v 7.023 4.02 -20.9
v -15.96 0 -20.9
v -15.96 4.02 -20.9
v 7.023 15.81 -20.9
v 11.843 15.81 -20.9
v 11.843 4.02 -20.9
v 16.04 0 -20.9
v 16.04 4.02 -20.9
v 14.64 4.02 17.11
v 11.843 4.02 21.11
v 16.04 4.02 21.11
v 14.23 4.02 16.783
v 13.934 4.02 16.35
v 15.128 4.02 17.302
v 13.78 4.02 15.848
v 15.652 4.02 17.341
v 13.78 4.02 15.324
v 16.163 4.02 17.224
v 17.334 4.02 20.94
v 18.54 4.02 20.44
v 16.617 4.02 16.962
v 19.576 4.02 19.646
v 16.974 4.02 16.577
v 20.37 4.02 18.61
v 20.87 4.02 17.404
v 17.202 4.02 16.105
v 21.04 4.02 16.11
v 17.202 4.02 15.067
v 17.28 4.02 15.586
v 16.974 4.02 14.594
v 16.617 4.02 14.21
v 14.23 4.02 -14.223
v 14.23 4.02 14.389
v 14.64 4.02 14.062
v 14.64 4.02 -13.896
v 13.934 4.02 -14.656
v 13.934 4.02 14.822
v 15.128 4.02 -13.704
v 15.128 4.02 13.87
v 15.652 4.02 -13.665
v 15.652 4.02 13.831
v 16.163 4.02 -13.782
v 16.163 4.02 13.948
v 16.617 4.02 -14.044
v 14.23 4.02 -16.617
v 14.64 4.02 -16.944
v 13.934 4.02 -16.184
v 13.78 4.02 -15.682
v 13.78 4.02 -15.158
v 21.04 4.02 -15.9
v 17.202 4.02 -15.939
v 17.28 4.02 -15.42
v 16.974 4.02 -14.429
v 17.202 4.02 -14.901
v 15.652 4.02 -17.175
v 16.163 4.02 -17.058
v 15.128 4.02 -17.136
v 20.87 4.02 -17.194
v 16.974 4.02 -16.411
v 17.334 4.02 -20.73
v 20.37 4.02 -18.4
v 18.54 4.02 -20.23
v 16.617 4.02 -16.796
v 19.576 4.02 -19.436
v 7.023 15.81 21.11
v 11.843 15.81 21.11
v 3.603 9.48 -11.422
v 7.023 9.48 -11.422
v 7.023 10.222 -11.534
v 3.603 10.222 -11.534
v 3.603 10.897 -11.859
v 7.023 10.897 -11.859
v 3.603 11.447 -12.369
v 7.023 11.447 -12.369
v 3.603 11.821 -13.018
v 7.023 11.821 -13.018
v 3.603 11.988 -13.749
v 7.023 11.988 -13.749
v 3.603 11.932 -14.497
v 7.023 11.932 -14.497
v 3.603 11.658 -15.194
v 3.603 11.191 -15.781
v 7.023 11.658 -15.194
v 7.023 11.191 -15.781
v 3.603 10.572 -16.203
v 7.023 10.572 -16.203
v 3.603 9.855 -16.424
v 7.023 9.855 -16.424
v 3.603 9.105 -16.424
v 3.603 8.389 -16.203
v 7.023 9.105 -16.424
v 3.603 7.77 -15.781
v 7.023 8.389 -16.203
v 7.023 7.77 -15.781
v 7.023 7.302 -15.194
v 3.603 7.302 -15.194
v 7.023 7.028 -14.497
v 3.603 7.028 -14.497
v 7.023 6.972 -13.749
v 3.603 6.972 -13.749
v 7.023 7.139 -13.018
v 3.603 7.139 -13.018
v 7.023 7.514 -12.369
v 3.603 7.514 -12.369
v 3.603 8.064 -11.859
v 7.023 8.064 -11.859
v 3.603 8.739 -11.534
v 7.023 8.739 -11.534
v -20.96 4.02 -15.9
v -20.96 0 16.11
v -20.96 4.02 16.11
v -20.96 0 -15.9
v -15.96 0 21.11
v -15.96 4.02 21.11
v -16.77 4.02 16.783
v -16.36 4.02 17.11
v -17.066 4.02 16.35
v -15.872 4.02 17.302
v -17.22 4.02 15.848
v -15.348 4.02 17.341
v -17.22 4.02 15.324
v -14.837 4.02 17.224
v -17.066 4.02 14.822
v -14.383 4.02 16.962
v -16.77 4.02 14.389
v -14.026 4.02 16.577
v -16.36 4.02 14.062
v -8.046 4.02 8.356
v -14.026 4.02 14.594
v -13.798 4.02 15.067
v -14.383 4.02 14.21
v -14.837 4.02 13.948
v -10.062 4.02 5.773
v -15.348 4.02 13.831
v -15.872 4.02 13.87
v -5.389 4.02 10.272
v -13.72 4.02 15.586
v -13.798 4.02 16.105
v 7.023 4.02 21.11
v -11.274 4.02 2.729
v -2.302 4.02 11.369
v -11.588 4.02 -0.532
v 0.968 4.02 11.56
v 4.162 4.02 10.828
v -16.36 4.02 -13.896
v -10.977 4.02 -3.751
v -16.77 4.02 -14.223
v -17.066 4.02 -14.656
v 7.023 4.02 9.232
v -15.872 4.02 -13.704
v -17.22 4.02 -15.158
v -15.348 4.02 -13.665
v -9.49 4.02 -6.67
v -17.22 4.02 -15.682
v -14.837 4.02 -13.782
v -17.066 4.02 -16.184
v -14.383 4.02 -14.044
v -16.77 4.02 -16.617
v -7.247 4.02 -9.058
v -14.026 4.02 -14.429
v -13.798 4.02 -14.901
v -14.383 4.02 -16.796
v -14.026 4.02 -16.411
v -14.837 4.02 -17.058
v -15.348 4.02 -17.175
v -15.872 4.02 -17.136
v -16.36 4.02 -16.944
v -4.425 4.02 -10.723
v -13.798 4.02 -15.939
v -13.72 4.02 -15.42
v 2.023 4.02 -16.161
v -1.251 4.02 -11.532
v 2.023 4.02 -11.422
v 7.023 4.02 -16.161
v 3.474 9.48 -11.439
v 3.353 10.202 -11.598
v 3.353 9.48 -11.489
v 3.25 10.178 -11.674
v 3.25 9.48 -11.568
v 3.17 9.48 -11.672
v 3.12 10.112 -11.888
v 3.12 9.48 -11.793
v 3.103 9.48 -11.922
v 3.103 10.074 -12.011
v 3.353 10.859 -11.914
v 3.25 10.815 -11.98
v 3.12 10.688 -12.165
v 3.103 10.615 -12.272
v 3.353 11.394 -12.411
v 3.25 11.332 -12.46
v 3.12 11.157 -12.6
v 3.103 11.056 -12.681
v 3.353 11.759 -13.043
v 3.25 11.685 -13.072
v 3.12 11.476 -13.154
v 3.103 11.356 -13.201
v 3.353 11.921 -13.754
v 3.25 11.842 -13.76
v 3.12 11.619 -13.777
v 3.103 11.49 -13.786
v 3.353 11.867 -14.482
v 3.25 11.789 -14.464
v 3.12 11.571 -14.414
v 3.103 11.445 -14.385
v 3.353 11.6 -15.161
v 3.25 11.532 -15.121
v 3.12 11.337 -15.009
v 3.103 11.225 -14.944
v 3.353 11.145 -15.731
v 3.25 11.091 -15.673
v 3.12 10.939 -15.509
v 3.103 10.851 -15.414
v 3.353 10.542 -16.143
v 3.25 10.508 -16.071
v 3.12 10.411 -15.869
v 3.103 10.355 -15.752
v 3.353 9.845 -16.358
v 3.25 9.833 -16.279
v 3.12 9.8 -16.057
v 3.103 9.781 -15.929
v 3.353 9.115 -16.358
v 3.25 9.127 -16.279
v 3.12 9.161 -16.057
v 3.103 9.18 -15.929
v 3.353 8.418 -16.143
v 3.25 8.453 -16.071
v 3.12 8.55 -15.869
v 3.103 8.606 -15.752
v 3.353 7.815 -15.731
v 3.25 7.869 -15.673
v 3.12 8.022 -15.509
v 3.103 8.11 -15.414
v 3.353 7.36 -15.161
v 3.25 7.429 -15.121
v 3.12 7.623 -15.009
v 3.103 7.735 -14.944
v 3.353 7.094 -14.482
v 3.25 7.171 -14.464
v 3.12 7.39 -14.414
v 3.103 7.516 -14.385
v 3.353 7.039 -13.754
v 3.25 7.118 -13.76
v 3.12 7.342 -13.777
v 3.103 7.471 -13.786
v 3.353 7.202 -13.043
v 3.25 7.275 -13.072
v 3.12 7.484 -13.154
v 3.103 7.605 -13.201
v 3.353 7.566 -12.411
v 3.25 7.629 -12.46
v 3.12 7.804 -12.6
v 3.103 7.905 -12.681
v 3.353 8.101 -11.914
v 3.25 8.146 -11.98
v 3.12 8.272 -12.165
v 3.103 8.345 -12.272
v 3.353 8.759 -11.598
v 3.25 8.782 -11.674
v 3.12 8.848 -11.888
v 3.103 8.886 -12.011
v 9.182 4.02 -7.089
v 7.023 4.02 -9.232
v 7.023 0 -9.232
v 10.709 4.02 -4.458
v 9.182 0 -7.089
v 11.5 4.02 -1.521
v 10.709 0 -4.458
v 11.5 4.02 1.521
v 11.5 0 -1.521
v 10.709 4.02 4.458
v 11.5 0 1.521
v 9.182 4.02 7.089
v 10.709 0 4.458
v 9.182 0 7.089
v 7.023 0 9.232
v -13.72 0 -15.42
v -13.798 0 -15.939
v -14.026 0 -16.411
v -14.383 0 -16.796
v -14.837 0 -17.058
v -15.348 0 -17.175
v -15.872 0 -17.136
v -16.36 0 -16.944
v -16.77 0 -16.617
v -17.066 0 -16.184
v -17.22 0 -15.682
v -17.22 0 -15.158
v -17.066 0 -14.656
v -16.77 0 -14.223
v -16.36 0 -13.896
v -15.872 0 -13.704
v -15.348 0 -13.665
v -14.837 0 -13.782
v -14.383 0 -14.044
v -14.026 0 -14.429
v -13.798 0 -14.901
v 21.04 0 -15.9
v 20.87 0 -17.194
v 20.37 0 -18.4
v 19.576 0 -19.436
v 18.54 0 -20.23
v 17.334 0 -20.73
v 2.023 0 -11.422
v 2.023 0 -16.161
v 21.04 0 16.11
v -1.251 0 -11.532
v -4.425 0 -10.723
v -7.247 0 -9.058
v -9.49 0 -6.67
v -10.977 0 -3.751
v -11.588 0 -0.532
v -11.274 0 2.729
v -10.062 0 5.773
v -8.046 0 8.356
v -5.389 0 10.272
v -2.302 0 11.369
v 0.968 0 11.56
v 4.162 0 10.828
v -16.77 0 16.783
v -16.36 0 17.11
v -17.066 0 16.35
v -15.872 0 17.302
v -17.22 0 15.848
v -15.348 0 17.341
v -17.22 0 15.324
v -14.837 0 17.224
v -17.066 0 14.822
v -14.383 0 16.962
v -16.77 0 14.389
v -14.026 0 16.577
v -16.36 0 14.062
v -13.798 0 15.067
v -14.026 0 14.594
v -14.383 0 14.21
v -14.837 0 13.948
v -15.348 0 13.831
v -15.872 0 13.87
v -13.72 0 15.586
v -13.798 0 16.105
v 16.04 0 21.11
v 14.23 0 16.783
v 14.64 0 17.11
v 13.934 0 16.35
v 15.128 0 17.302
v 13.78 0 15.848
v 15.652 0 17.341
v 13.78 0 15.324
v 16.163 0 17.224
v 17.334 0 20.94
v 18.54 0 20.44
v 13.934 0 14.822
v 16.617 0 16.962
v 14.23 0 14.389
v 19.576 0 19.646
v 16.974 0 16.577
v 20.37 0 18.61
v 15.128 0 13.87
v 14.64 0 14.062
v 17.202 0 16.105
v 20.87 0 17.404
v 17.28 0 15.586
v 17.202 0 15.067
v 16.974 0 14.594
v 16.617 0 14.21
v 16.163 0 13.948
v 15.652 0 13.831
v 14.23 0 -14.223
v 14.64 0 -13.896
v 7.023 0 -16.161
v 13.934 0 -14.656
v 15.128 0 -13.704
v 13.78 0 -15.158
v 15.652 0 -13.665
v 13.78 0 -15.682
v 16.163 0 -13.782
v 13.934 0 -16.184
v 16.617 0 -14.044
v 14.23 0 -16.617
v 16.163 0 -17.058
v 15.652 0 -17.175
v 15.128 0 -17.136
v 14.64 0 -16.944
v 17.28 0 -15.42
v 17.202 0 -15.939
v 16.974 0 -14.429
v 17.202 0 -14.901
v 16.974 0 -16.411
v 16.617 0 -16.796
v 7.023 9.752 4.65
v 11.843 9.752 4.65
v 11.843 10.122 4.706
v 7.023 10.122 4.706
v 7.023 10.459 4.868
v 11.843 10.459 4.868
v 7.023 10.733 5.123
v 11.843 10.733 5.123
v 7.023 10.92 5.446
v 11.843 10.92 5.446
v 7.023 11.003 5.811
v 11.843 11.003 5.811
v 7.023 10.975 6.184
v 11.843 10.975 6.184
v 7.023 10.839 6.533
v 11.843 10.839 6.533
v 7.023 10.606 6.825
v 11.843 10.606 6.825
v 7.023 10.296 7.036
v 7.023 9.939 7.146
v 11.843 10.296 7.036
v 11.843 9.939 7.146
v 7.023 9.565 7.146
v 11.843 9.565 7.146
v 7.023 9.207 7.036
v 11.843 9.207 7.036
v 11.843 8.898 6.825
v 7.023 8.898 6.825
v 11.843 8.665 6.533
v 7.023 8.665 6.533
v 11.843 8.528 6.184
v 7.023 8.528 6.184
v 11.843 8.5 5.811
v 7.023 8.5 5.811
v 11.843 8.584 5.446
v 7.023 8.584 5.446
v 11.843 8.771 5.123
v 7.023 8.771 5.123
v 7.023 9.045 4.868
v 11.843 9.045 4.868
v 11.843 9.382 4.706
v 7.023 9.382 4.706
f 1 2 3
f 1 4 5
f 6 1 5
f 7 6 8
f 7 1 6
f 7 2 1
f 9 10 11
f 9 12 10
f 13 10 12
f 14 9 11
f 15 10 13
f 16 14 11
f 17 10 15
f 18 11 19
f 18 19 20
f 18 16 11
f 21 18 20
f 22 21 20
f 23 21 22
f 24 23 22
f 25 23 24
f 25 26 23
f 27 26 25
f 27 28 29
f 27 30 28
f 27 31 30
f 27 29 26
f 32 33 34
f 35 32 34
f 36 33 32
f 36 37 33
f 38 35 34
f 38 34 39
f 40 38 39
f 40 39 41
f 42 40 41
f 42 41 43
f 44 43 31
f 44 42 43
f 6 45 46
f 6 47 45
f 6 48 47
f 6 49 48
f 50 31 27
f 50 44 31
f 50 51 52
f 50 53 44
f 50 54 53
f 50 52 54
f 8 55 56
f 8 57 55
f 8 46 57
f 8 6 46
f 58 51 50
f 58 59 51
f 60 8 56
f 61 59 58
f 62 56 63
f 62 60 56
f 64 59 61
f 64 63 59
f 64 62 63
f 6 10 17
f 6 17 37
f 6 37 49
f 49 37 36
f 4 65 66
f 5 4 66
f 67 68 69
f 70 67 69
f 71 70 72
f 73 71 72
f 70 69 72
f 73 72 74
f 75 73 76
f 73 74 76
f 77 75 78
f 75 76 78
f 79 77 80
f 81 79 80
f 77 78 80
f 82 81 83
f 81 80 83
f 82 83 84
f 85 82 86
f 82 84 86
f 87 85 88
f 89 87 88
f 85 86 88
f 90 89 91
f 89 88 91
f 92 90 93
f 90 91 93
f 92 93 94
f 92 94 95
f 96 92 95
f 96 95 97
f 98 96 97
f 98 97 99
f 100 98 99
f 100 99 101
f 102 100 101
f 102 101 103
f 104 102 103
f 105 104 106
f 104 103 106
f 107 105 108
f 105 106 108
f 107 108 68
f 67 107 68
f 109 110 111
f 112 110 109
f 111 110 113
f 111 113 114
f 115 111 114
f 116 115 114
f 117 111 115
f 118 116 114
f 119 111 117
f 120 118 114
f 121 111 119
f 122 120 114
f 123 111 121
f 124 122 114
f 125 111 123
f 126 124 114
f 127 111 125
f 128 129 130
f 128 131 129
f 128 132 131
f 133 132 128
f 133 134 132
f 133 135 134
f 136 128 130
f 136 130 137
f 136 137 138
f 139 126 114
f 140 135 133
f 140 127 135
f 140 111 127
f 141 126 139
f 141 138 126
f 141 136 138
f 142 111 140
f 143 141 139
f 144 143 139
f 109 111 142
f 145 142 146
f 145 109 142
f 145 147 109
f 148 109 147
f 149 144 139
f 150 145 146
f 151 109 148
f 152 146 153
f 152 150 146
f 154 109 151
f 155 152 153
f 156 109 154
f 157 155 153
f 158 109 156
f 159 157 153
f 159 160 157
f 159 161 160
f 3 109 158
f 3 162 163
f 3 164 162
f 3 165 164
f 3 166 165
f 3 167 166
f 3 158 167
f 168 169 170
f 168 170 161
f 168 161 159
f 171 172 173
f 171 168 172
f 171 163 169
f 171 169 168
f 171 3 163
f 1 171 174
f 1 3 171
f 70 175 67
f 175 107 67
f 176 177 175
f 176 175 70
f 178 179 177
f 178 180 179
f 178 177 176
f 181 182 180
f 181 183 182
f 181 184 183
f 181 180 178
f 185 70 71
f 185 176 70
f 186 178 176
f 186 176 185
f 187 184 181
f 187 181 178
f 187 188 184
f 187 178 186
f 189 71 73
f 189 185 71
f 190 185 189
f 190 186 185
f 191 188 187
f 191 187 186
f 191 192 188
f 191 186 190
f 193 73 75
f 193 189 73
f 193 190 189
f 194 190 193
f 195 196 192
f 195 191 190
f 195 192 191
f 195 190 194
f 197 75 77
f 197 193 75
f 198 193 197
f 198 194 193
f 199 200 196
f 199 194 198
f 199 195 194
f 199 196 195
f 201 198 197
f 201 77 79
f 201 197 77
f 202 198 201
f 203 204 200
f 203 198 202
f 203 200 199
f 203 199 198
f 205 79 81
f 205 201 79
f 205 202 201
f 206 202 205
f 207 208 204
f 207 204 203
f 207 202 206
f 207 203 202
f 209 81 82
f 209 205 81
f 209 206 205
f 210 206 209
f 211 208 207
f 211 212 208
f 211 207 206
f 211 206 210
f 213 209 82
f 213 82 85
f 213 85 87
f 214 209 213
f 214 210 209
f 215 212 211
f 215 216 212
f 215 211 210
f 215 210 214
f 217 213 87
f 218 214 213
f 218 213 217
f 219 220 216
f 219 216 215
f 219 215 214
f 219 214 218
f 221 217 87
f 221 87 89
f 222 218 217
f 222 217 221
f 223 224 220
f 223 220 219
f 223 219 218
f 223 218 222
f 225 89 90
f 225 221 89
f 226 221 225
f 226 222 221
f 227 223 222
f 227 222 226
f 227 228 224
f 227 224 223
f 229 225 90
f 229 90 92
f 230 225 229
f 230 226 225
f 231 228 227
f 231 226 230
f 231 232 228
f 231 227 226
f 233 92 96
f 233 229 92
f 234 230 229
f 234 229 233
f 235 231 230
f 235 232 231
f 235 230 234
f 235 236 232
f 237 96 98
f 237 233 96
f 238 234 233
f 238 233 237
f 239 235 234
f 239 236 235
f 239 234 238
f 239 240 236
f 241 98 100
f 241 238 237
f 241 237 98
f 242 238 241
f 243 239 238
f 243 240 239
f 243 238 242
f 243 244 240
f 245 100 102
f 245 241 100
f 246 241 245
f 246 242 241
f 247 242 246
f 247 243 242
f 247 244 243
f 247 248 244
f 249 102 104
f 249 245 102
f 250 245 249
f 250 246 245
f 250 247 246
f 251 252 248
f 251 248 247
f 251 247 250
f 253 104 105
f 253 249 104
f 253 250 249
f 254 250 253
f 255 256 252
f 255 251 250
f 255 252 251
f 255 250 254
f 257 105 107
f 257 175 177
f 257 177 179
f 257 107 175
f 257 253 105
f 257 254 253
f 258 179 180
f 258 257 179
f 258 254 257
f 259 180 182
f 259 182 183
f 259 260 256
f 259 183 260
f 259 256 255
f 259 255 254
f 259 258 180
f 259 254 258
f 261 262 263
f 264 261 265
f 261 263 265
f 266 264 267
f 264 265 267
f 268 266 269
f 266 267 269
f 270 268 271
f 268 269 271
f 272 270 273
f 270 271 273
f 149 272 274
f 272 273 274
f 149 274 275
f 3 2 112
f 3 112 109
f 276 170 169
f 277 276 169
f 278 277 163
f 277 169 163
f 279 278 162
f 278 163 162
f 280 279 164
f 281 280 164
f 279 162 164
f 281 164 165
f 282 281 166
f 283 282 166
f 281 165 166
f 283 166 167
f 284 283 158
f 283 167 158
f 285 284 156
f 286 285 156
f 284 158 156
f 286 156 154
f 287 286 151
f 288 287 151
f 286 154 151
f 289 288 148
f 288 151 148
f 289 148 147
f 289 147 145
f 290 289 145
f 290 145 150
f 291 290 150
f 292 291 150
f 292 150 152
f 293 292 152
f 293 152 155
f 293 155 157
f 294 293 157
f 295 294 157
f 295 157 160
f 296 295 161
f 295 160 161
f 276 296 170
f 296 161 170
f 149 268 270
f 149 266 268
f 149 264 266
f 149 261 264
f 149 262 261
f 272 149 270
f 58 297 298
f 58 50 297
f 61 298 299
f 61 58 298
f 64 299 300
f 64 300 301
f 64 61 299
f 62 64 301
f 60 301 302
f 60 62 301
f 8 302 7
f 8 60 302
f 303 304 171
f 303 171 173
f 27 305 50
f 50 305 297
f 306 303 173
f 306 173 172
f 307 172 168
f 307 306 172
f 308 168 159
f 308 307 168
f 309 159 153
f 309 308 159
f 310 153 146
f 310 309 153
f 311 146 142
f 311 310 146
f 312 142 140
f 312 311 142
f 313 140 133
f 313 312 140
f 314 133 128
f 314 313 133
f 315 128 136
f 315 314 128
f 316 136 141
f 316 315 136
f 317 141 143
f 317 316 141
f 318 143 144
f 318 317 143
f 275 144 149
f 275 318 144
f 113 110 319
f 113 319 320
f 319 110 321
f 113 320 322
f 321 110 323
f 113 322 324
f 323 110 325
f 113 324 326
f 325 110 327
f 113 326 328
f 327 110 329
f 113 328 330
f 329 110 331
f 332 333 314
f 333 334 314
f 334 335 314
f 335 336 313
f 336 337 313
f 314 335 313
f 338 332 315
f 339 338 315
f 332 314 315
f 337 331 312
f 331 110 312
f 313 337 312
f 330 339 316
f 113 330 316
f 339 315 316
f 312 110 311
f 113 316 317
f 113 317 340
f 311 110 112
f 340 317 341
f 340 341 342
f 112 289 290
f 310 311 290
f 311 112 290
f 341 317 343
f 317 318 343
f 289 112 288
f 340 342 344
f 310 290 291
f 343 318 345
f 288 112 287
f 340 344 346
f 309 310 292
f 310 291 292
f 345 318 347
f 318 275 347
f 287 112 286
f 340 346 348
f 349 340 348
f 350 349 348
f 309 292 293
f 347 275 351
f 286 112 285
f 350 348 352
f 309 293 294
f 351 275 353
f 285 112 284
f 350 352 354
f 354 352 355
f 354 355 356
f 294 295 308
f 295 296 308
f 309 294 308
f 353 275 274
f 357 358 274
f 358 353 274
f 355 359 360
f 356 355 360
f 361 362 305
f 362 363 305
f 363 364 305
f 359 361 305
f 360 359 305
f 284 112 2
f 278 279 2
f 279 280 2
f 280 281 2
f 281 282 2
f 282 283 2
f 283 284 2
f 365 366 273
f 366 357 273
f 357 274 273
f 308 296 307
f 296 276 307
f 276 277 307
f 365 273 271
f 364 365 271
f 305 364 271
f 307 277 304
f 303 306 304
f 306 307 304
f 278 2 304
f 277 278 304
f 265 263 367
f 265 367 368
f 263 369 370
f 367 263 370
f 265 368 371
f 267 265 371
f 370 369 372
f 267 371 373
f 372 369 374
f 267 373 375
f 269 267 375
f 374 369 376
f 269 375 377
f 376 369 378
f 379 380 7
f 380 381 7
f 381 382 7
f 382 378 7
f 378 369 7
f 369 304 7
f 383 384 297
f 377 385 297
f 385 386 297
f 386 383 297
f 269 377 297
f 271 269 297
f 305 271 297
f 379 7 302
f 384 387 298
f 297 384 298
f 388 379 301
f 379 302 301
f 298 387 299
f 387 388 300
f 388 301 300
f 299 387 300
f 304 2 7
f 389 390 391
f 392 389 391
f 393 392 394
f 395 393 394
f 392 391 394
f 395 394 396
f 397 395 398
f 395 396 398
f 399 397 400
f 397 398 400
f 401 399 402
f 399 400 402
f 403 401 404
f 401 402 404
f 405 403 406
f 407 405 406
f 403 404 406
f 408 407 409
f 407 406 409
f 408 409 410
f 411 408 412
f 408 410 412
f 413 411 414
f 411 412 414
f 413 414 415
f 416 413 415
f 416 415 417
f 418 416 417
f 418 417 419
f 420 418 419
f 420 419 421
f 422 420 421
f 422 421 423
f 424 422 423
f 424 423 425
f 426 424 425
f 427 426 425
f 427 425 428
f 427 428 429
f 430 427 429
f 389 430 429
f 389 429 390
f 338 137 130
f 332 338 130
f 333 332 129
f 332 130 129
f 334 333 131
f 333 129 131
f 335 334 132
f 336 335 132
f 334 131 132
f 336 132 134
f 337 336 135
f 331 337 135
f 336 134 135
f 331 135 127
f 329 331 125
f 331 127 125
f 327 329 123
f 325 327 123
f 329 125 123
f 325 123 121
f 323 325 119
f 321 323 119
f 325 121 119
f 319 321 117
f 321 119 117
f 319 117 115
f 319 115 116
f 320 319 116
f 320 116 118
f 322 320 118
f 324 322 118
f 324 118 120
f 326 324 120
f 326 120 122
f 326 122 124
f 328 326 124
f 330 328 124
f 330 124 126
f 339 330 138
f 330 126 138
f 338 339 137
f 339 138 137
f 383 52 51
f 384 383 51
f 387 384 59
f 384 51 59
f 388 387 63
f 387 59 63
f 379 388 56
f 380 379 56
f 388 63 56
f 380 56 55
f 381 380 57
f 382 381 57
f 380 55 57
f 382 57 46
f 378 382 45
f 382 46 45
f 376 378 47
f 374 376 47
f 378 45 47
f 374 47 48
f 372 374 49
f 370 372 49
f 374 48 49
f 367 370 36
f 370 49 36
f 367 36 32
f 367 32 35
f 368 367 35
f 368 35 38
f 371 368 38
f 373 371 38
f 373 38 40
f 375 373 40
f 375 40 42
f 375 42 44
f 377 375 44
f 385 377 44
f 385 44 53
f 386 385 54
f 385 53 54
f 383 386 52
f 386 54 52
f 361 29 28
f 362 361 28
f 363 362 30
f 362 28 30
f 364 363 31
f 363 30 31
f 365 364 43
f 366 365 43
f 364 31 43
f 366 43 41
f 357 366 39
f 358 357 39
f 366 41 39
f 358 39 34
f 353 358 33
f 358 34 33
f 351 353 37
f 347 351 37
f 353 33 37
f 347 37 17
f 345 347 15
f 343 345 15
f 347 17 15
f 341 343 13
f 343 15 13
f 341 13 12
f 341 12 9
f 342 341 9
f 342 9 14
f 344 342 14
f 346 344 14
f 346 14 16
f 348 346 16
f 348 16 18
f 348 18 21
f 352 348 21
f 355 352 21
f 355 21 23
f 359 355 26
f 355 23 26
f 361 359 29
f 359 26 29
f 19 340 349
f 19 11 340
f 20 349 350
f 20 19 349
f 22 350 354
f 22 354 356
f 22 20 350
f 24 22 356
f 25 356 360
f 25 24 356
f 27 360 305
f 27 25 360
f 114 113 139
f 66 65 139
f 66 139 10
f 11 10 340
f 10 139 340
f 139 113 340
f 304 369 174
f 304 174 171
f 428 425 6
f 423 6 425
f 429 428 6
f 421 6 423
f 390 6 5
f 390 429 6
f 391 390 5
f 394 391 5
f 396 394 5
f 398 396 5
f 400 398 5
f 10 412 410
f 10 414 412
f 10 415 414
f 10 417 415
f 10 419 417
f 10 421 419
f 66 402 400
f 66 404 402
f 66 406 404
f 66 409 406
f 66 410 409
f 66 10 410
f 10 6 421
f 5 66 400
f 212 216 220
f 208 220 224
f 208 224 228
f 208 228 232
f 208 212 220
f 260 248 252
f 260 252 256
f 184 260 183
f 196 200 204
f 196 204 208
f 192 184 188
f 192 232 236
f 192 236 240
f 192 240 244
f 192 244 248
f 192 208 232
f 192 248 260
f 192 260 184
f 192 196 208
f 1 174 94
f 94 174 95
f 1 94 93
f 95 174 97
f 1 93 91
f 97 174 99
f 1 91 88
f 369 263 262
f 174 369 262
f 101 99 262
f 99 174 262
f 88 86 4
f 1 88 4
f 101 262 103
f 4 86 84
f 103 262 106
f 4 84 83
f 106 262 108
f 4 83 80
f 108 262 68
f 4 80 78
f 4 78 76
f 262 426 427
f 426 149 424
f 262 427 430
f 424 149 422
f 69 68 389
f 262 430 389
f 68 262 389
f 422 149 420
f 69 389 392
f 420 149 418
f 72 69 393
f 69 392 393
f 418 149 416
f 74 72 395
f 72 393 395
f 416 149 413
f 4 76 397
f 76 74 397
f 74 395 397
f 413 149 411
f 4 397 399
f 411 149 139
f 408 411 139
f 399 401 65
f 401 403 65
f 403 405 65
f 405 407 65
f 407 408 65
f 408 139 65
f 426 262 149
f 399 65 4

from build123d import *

# Parameters (mm, degrees)
SKETCH2_W           = 42
SKETCH2_H           = 42.01
BOSS_EXTRUDE2_DEPTH = 4.02
SKETCH3_W           = 4.82
SKETCH3_H           = 15.81
BOSS_EXTRUDE3_DEPTH = 42.01
SKETCH4_R           = 11.6
CUT_EXTRUDE1_DEPTH  = 4.02
SKETCH5_R           = 1.255
CUT_EXTRUDE2_DEPTH  = 33.803184685
CHAMFER1_SIZE       = 5
SKETCH6_R           = 1.76
CUT_EXTRUDE3_DEPTH  = 4.02
FILLET1_R           = 5
SKETCH7_R           = 2.515
BOSS_EXTRUDE4_DEPTH = 3.92
FILLET3_R           = 0.5


with BuildPart() as part:
    # Sketch2 → Boss-Extrude2 (new body)
    with BuildSketch(Plane(origin=(0, 0, 0), x_dir=(1, 0, 0), z_dir=(0, 1, 0))):
        with Locations((0.04, -0.105)):
            Rectangle(SKETCH2_W, SKETCH2_H)
        with BuildLine():
            Line((2.023352998, 16.161086645), (2.023352998, 11.422173289))
            ThreePointArc((2.023352998, 11.422173289), (-7.967970915, -8.430387861), (11.29, 2.663813057))
            Line((11.29, 2.663813057), (11.29, 16.161086645))
            Line((11.29, 16.161086645), (4.04, 16.161086645))
            Line((4.04, 16.161086645), (2.023352998, 16.161086645))
        make_face(mode=Mode.SUBTRACT)
    extrude(amount=BOSS_EXTRUDE2_DEPTH)

    # Sketch3 → Boss-Extrude3 (add)
    with BuildSketch(Plane.XY.offset(21.11)):
        with Locations((9.433184685, 7.905)):
            Rectangle(SKETCH3_W, SKETCH3_H)
    extrude(amount=-BOSS_EXTRUDE3_DEPTH)

    # Sketch4 → Cut-Extrude1 (cut)
    with BuildSketch(Plane.XZ):
        Circle(SKETCH4_R)
    extrude(amount=-CUT_EXTRUDE1_DEPTH, mode=Mode.SUBTRACT)

    # Sketch5 → Cut-Extrude2 (cut, through all)
    with BuildSketch(Plane(origin=(11.843184685, 0, 0), x_dir=(0, 0, -1), z_dir=(1, 0, 0))):
        with Locations((-5.905, 9.751921695)):
            Circle(SKETCH5_R)
    extrude(amount=-CUT_EXTRUDE2_DEPTH, mode=Mode.SUBTRACT)

    # Chamfer1
    chamfer1_edges = [part.edges().sort_by_distance(p)[0] for p in [
        (-20.96, 2.01, -20.9),
        (-20.96, 2.01, 21.11),
    ]]
    chamfer(chamfer1_edges, length=CHAMFER1_SIZE)

    # Sketch6 → Cut-Extrude3 (cut)
    with BuildSketch(Plane(origin=(0, 4.02, 0), x_dir=(1, 0, 0), z_dir=(0, 1, 0))):
        with Locations((-15.48, 15.42)):
            Circle(SKETCH6_R)
        with Locations((15.52, 15.42)):
            Circle(SKETCH6_R)
        with Locations((-15.48, -15.585900263)):
            Circle(SKETCH6_R)
        with Locations((15.52, -15.585900263)):
            Circle(SKETCH6_R)
    extrude(amount=-CUT_EXTRUDE3_DEPTH, mode=Mode.SUBTRACT)

    # Fillet1
    fillet1_edges = [part.edges().sort_by_distance(p)[0] for p in [
        (21.04, 2.01, -20.9),
        (21.04, 2.01, 21.11),
    ]]
    fillet(fillet1_edges, radius=FILLET1_R)

    # Sketch7 → Boss-Extrude4 (add)
    with BuildSketch(Plane.ZY.offset(-7.023184685)):
        with Locations((-13.936978862, 9.480319198)):
            Circle(SKETCH7_R)
    extrude(amount=BOSS_EXTRUDE4_DEPTH)

    # Fillet3
    fillet3_edges = [part.edges().sort_by_distance(p)[0] for p in [
        (3.103184685, 9.480319198, -16.451978862),
    ]]
    fillet(fillet3_edges, radius=FILLET3_R)


solid = part.part
